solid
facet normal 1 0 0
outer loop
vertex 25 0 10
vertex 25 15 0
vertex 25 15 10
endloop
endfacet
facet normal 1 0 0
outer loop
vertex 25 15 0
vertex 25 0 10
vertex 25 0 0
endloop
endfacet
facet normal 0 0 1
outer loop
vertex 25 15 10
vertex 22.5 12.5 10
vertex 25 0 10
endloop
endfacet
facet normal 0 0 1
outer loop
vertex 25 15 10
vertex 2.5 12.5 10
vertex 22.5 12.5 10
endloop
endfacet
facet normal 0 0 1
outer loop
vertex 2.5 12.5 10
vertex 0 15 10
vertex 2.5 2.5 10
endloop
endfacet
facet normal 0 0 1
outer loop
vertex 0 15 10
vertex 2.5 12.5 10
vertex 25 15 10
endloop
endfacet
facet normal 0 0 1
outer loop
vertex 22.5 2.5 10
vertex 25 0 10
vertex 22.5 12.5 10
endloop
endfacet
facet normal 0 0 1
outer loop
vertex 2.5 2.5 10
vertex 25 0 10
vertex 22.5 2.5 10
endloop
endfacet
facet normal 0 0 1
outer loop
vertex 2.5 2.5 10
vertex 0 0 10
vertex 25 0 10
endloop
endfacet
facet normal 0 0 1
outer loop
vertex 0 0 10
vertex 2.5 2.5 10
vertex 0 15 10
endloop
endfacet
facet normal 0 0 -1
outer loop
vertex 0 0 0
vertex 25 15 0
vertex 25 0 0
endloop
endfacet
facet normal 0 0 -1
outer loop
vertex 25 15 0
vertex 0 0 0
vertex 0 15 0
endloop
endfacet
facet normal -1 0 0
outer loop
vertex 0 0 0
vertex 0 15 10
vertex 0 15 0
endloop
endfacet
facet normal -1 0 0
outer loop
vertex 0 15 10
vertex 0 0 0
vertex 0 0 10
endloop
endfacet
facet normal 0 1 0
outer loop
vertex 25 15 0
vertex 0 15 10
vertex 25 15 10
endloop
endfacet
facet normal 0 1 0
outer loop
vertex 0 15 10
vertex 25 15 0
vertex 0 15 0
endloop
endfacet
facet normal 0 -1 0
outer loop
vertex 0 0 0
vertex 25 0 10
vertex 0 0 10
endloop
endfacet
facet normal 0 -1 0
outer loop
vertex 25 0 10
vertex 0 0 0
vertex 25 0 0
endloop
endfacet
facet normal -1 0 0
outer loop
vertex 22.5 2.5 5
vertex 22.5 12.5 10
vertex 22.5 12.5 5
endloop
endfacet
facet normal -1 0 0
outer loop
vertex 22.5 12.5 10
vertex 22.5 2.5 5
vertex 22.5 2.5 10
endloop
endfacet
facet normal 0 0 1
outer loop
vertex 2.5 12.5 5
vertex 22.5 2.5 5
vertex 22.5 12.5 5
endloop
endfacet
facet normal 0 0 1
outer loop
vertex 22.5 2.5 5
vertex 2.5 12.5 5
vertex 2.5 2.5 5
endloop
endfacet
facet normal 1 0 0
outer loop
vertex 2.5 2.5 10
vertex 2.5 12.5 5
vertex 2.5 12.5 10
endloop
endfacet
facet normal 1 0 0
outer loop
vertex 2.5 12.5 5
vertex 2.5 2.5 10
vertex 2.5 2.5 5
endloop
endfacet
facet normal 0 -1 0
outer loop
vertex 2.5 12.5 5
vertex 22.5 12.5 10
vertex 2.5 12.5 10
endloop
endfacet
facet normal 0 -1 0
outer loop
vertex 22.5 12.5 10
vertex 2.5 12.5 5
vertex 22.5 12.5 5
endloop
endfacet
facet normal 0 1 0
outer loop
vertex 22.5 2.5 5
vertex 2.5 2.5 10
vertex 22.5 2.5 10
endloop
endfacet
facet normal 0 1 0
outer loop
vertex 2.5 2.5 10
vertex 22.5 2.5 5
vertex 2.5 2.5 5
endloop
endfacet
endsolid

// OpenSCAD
// file: atmega_breakout.scad
module atmega_breakout(){
    LENGTH = 20;    // guess
    WIDTH = 10;     // guess
    DEPTH = 5;      // default
    
    cube([LENGTH, WIDTH, DEPTH]);
}

//atmega_breakout();
// main file
include <atmega_breakout.scad>


module atmega_breakout_mount(){
    
    LENGTH = 25;    // guess
    WIDTH = 15;     // guess
    DEPTH = 10;     // default
    
    difference(){
        
        cube([LENGTH, WIDTH, DEPTH]);
        
        translate([(LENGTH/2) - (20/2),(WIDTH/2)-(10/2),5]){
            #atmega_breakout();
        }
    }
}

atmega_breakout_mount();
